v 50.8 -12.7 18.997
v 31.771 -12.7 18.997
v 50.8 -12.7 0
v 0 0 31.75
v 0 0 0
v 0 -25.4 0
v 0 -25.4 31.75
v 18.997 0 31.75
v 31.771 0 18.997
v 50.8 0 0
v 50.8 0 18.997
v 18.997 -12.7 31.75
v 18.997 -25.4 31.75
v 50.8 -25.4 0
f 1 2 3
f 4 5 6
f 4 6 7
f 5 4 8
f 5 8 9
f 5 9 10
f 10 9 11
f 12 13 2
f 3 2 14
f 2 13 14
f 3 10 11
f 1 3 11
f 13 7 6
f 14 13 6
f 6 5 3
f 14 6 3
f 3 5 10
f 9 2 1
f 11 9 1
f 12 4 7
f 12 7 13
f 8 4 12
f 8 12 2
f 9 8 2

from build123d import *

# Parameters (mm, degrees)
F0_W     = 50.8
F0_H     = 31.75
F1_DEPTH = 25.4
F3_DEPTH = 12.7
F5_DEPTH = 12.7
F7_DEPTH = 12.701


with BuildPart() as f1:
    # F0 (on Front) → F1 (new body)
    with BuildSketch(Plane.XZ):
        with Locations((25.4, 15.875)):
            Rectangle(F0_W, F0_H)
    extrude(amount=F1_DEPTH)

    # F2 (on Front) → F3 (cut)
    with BuildSketch(Plane.XZ):
        Polygon((31.426101923, 5.7290680707), (38.6526212096, -0.4363064363), (50.3639169037, 0), (50.3639169037, 5.7290680707), align=None)
    extrude(amount=-F3_DEPTH, mode=Mode.SUBTRACT)

    # F4 (on face) → F5 (cut)
    with BuildSketch(Plane.XZ.offset(25.4)):
        Polygon((50.8, 31.75), (18.997348845, 31.75), (50.8, 0), align=None)
    extrude(amount=-F5_DEPTH, mode=Mode.SUBTRACT)

    # F6 (on face) → F7 (cut, through all)
    with BuildSketch(Plane.XZ.offset(12.7)):
        Polygon((31.7711477736, 18.997348845), (50.8, 18.997348845), (50.8, 31.75), (18.997348845, 31.75), align=None)
    extrude(amount=-F7_DEPTH, mode=Mode.SUBTRACT)


solid = f1.part
